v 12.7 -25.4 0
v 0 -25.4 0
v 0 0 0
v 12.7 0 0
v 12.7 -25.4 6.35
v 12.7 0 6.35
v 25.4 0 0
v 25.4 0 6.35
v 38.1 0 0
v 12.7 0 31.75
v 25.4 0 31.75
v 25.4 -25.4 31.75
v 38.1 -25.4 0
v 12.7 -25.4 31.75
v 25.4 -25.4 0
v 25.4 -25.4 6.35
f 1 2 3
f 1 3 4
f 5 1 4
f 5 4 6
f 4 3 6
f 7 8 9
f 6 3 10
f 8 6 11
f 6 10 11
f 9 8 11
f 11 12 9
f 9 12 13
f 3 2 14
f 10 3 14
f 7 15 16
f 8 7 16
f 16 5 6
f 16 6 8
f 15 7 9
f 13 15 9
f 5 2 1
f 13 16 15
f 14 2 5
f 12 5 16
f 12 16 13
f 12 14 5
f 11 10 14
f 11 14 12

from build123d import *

# Parameters (mm, degrees)
F0_W     = 38.1
F0_H     = 31.75
F1_DEPTH = 25.4
F3_DEPTH = 25.4
F4_DEPTH = 25.4
F5_W     = 12.7
F5_H     = 6.35
F6_DEPTH = 25.401


# Not quite as in the source:
# - a feature names something its author has since deleted; it is built from what else it names


with BuildPart() as f1:
    # F0 (on Front) → F1 (new body)
    with BuildSketch(Plane.XZ):
        with Locations((19.05, 15.875)):
            Rectangle(F0_W, F0_H)
    extrude(amount=F1_DEPTH)

    # F0 (on Front) → F3 (join)
    with BuildSketch(Plane.XZ):
        with Locations((19.05, 15.875)):
            Rectangle(F0_W, F0_H)
    extrude(amount=F3_DEPTH)

    # F0 (on Front) → F4 (join)
    with BuildSketch(Plane.XZ):
        with Locations((19.05, 15.875)):
            Rectangle(F0_W, F0_H)
    extrude(amount=F4_DEPTH)

    # F5 (on face) → F6 (cut, through all)
    with BuildSketch(Plane.XZ.offset(25.4)):
        Polygon((0, 31.75), (0, 0), (12.7, 31.75), align=None)
        Polygon((38.1, 31.75), (25.4, 31.75), (38.1, 0), align=None)
        with Locations((19.05, 3.175)):
            Rectangle(F5_W, F5_H)
    extrude(amount=-F6_DEPTH, mode=Mode.SUBTRACT)


solid = f1.part
